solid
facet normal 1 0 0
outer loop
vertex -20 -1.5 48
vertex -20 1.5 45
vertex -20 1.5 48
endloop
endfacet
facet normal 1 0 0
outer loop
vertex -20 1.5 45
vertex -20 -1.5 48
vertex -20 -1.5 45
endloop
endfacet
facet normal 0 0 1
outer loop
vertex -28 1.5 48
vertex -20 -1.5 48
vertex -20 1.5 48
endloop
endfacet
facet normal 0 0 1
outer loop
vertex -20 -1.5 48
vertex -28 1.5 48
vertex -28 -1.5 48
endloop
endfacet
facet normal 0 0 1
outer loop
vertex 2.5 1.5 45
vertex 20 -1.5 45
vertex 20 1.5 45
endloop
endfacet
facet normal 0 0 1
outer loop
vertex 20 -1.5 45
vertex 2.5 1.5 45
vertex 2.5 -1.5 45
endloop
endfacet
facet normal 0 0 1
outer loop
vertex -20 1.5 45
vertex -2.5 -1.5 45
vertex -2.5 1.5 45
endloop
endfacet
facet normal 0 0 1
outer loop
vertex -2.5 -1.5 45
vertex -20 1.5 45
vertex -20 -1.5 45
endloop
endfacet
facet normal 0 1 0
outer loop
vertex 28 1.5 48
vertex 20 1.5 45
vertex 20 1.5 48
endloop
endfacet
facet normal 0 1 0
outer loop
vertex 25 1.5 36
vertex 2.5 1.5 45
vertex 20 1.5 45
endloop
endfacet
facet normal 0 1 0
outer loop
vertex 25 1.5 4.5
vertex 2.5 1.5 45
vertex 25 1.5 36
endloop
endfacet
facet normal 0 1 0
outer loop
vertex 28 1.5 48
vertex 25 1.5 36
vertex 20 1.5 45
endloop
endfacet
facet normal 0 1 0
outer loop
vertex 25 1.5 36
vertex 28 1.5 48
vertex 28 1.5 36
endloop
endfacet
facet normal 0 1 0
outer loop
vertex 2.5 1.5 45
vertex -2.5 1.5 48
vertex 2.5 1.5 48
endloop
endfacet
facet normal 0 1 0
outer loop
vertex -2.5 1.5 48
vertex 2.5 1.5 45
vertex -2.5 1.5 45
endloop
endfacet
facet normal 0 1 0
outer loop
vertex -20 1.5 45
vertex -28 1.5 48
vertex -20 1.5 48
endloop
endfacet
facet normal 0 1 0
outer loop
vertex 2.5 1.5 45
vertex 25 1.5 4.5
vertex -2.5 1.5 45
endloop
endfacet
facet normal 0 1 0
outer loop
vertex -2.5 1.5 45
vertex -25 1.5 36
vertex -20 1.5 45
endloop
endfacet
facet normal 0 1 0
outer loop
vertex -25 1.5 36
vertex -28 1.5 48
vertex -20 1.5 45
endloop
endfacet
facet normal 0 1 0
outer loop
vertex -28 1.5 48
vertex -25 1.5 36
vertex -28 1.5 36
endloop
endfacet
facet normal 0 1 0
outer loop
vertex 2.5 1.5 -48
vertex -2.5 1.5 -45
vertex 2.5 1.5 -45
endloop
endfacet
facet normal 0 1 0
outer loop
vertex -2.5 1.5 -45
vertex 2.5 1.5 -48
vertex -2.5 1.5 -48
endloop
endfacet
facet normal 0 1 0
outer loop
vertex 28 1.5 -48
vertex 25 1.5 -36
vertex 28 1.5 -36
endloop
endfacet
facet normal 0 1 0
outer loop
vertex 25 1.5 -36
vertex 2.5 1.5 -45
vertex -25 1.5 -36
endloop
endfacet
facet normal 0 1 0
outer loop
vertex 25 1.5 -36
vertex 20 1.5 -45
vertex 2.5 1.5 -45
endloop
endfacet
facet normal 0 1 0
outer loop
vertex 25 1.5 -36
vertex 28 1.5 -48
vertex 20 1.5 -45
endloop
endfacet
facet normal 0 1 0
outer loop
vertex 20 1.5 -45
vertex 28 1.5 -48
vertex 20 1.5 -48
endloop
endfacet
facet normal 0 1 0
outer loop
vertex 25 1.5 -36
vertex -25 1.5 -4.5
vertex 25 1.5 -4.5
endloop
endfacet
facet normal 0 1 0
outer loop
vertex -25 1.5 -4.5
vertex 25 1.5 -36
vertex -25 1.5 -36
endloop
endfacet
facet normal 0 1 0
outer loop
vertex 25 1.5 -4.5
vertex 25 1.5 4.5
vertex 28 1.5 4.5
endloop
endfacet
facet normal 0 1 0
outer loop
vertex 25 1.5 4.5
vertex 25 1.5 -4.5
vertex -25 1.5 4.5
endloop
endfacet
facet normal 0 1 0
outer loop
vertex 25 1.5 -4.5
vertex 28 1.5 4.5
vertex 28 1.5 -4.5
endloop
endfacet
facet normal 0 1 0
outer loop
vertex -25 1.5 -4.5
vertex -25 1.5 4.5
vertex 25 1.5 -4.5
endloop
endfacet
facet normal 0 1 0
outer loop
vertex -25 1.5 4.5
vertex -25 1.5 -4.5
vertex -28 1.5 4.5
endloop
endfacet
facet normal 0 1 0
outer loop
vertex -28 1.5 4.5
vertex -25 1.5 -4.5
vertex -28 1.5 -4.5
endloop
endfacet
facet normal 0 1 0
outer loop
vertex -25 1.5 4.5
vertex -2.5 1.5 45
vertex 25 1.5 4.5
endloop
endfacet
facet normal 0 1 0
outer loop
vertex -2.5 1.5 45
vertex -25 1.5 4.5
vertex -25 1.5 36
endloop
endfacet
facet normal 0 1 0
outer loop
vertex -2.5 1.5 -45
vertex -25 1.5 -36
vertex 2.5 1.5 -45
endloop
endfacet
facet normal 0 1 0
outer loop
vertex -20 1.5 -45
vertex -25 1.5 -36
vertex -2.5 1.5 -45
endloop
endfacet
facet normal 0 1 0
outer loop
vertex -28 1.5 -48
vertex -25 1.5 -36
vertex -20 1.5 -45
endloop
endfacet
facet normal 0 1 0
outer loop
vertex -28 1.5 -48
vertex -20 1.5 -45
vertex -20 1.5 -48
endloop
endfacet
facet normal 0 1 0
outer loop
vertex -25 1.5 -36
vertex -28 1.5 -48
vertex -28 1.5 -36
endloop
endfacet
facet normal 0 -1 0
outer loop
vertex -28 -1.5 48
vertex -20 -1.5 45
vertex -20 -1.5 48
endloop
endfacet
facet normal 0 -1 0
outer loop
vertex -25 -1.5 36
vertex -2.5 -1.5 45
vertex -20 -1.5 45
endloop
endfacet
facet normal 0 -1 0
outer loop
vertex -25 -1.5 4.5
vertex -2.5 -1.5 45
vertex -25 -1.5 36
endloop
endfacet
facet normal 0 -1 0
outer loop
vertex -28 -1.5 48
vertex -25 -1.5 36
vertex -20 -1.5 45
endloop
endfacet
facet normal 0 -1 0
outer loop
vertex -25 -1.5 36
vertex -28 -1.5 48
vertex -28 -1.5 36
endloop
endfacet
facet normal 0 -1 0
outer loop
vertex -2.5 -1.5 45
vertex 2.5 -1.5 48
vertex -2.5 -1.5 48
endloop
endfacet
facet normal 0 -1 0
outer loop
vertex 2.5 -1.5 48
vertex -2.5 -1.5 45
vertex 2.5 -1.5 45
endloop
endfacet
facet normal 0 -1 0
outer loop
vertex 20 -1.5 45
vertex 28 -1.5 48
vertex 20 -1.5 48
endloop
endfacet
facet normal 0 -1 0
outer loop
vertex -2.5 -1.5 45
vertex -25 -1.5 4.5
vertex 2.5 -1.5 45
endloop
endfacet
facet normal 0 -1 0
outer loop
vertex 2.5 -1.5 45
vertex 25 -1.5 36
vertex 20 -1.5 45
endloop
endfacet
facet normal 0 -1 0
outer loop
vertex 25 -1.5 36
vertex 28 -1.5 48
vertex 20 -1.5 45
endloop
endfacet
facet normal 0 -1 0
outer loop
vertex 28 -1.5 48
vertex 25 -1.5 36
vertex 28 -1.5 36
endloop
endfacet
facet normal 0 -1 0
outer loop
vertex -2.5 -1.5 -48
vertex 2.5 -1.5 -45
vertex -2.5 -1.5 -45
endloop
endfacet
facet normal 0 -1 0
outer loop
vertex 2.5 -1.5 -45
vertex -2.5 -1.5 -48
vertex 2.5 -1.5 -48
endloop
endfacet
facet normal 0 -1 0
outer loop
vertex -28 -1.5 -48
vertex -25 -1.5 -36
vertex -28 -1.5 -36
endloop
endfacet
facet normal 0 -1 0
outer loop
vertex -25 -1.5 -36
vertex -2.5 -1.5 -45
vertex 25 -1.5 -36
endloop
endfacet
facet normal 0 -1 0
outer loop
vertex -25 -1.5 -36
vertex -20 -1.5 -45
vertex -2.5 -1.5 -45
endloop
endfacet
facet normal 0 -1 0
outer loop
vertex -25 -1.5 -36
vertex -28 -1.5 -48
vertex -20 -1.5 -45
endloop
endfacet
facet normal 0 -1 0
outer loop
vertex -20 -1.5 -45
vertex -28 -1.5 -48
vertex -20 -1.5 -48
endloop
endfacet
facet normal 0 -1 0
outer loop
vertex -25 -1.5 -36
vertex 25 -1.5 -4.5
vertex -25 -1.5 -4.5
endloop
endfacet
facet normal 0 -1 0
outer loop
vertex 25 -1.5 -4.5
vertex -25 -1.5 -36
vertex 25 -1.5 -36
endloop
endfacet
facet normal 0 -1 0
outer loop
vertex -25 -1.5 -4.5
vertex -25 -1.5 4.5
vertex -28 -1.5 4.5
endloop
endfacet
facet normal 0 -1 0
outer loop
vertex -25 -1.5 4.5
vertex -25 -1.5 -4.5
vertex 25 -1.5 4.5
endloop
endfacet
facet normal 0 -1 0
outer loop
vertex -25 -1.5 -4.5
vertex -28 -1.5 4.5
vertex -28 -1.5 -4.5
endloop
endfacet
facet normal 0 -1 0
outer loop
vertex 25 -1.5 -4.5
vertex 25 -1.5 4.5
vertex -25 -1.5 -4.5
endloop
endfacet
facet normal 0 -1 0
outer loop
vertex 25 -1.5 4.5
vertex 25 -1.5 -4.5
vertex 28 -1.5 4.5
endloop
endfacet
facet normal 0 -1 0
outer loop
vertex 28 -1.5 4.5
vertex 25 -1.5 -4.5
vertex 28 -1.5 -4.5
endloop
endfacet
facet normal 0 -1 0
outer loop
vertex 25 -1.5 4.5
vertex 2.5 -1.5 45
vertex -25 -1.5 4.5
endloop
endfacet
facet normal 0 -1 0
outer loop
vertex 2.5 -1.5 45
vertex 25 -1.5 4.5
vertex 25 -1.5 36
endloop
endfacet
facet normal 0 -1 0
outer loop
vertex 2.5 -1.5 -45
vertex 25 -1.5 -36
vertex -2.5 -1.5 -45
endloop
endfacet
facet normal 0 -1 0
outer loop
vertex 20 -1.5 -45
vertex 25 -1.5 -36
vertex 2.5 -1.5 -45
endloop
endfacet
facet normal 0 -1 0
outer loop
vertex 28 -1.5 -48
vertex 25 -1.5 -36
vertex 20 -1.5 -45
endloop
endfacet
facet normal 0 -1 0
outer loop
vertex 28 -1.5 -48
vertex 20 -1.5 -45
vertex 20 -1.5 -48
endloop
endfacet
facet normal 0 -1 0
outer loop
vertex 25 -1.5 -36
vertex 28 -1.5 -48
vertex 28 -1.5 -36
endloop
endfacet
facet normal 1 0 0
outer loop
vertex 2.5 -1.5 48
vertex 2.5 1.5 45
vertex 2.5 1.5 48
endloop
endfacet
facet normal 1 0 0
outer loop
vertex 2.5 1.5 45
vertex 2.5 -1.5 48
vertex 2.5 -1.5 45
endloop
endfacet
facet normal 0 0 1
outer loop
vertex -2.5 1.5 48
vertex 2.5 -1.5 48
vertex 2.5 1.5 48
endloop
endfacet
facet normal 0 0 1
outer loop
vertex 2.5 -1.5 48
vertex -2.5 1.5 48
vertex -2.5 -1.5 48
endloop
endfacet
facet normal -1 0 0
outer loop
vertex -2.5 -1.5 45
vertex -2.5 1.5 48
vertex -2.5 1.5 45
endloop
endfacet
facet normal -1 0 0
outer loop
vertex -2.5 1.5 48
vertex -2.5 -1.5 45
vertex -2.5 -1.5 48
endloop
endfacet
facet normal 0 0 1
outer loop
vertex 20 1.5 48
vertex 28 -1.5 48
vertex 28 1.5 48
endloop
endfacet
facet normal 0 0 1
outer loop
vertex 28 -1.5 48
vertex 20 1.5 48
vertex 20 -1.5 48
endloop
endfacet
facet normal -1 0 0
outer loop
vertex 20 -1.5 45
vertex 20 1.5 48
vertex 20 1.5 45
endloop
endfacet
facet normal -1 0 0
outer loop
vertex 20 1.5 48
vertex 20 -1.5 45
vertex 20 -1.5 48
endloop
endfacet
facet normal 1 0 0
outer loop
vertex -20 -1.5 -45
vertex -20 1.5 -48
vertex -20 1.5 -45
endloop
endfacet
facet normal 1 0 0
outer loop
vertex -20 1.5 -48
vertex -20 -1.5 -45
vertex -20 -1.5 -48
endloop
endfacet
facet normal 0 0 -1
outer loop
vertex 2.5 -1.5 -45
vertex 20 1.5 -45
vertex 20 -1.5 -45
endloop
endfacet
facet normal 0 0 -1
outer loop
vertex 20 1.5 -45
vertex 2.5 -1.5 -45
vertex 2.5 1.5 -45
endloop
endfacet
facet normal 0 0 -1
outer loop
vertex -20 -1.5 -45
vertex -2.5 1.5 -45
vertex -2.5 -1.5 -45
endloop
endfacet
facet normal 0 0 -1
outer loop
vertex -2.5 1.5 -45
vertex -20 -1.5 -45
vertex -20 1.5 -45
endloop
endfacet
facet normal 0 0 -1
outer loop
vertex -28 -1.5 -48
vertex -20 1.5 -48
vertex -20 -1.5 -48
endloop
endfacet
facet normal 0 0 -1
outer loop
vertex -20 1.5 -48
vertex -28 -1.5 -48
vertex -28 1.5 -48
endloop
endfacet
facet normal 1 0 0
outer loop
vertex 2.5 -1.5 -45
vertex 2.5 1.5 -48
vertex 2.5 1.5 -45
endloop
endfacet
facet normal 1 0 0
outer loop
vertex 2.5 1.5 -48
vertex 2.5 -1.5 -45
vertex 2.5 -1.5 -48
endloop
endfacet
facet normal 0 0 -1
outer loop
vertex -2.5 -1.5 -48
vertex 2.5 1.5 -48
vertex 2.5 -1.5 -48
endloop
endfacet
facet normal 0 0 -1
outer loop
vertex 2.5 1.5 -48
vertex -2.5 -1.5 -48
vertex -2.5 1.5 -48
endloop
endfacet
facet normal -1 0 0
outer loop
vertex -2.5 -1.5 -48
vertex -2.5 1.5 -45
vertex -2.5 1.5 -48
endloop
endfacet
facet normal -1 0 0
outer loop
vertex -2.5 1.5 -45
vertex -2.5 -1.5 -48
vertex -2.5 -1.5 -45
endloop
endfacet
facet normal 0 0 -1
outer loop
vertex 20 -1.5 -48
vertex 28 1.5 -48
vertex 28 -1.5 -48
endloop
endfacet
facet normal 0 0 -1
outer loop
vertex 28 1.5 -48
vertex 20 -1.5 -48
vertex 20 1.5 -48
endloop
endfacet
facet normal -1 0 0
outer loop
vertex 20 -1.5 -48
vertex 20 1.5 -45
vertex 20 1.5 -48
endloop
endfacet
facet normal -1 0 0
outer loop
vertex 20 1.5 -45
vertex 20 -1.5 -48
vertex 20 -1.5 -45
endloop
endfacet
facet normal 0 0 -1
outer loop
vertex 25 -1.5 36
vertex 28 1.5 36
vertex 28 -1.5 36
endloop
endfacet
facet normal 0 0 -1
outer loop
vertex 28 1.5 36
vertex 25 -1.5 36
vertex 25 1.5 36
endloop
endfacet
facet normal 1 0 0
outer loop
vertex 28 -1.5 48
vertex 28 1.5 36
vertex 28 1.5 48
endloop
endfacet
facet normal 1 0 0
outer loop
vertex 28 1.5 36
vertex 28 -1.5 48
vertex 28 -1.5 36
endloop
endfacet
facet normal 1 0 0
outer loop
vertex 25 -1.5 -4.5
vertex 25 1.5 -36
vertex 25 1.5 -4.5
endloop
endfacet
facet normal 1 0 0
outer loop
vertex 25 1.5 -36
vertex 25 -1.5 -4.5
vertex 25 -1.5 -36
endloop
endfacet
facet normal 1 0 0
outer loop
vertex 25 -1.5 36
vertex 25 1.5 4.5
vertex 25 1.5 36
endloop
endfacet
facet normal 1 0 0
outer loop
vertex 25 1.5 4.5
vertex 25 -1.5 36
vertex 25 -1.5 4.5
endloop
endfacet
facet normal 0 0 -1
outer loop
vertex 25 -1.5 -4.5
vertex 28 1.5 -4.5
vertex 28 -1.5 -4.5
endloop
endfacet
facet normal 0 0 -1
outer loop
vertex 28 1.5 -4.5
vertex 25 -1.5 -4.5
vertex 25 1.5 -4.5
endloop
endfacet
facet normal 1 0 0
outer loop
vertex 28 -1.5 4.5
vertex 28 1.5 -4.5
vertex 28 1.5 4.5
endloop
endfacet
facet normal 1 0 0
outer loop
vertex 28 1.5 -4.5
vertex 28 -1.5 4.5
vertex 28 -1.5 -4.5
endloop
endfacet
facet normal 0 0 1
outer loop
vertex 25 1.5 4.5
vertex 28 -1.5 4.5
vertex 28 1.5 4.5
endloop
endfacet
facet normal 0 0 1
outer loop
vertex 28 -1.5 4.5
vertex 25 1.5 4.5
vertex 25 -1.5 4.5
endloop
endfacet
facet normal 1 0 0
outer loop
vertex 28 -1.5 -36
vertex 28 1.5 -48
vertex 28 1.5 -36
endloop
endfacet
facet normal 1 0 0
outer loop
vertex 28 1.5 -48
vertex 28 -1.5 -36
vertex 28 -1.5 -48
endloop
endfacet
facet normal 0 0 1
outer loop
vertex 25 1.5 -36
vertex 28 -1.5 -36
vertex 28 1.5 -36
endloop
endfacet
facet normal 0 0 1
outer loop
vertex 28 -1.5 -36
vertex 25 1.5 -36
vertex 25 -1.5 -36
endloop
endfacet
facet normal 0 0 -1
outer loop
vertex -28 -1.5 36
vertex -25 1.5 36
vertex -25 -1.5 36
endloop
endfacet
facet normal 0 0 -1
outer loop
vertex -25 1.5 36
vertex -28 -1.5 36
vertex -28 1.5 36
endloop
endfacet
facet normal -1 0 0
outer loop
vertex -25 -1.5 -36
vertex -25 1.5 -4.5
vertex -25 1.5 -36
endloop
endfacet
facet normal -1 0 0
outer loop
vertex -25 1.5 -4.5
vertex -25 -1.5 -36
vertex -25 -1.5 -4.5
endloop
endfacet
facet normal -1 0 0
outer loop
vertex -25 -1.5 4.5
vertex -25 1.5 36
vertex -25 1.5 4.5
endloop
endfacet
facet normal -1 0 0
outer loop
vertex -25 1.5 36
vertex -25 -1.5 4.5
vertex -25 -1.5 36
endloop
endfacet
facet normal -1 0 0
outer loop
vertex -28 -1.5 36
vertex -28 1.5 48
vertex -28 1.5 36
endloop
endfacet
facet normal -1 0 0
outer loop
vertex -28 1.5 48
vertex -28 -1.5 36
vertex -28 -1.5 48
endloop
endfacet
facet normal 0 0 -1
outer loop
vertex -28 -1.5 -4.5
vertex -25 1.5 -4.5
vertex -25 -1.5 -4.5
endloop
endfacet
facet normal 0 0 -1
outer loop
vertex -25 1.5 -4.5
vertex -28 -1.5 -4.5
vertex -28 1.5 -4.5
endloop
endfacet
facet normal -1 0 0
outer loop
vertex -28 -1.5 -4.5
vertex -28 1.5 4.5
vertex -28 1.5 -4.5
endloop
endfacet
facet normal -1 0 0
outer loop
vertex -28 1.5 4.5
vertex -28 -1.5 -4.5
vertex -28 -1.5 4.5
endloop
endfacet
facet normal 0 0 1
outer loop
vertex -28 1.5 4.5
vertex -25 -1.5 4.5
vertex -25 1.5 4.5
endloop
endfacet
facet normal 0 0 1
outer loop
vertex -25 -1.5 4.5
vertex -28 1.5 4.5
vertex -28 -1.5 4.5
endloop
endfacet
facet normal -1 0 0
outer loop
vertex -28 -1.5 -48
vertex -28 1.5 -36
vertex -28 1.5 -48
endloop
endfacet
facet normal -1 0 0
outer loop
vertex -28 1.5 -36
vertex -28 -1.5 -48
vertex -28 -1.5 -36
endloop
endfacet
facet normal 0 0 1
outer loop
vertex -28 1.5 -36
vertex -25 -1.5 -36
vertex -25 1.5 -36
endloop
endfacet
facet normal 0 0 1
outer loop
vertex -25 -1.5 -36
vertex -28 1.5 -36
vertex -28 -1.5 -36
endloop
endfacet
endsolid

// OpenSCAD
// file: noses.scad
include <config.scad>;

/**
 * Generates configured number of noses
 * centered, along X axis, to normalized total length of 1
 */
module nose_positive()
{
    begin_x = -0.5;
    delta_x = (1-relative_nose_length) / (nose_count-1);
    for (i=[0:nose_count-1])
    {
        translate([
            begin_x + i*delta_x,
            -material_z/2,
            -material_z/2
            ])
        cube([
            relative_nose_length,
            material_z,
            material_z
            ]);
    }
}

/**
 * Generates the counterpart to nose_positive()
 */
module nose_negative()
{
    // subtract nose_positive() from centered cuboid
    difference()
    {
        translate([
            -0.5,
            -material_z/2,
            -material_z/2
            ])
        cube([
            1,
            material_z,
            material_z
            ]);
        // a little overscale to get rid of rendering artifacts
        scale([
            1.001,
            1.001,
            1.001
            ])
        nose_positive();
    }
}

nose_negative();
// file: config.scad
// all measures in mm

/*
 * Base material to cut from
 */
material_x = 510;
material_y = 370;
material_z = 3;

/*
 * Shark model measures
 */
shark_length = 100;

/*
 * Cuboid measures (inside)
 */
cuboid_x = shark_length / 2;
cuboid_y = cuboid_x+20;
cuboid_z = cuboid_x+40;

/*
 * Save some calculations
 */
cuboid_x_2 = cuboid_x / 2;
cuboid_y_2 = cuboid_y / 2;
cuboid_z_2 = cuboid_z / 2;
material_z_2 = material_z / 2;

/*
 * Nose properties
 */
// the number
nose_count = 3;
// width of a nose relative to length of the corresponding edge
relative_nose_length = 0.1;

/*
 * Rendering and projection properties
 */
// how far apart from on another to project the parts
projection_spacing = 1;
// rendering quality (face number)
$fn = 50;
// main file
include <config.scad>;
use <noses.scad>;

/**
 * Generate the top and bottom face of the cuboid
 * with noses, centered around origin
 */
module face_xz()
{
    color("green")
    {
        cube([
            cuboid_x,
            material_z,
            cuboid_z
            ], center=true);

        scale([
            cuboid_x,
            1,
            1
            ])
        {
            translate([
                0,
                0,
                cuboid_z_2 + material_z_2
                ])
            nose_positive();

            translate([
                0,
                0,
                - cuboid_z_2 - material_z_2,
                ])
            nose_positive();
        }

        rotate([
            0,
            90,
            0
            ])
        scale([
            cuboid_z,
            1,
            1
            ])
        {
            translate([
                0,
                0,
                cuboid_x_2 + material_z_2
                ])
            nose_positive();

            translate([
                0,
                0,
                - cuboid_x_2 - material_z_2
                ])
            nose_positive();
        }

        /*
         * fill the corners
         */
        translate([
            - cuboid_x_2 - material_z_2,
            0,
            - cuboid_z_2 - material_z_2
            ])
        cube([
            material_z,
            material_z,
            material_z
            ], center=true);

        translate([
            - cuboid_x_2 - material_z_2,
            0,
            + cuboid_z_2 + material_z_2
            ])
        cube([
            material_z,
            material_z,
            material_z
            ], center=true);

        translate([
            + cuboid_x_2 + material_z_2,
            0,
            + cuboid_z_2 + material_z_2
            ])
        cube([
            material_z,
            material_z,
            material_z
            ], center=true);

        translate([
            + cuboid_x_2 + material_z_2,
            0,
            - cuboid_z_2 - material_z_2
            ])
        cube([
            material_z,
            material_z,
            material_z
            ], center=true);
    }
}

face_xz();
